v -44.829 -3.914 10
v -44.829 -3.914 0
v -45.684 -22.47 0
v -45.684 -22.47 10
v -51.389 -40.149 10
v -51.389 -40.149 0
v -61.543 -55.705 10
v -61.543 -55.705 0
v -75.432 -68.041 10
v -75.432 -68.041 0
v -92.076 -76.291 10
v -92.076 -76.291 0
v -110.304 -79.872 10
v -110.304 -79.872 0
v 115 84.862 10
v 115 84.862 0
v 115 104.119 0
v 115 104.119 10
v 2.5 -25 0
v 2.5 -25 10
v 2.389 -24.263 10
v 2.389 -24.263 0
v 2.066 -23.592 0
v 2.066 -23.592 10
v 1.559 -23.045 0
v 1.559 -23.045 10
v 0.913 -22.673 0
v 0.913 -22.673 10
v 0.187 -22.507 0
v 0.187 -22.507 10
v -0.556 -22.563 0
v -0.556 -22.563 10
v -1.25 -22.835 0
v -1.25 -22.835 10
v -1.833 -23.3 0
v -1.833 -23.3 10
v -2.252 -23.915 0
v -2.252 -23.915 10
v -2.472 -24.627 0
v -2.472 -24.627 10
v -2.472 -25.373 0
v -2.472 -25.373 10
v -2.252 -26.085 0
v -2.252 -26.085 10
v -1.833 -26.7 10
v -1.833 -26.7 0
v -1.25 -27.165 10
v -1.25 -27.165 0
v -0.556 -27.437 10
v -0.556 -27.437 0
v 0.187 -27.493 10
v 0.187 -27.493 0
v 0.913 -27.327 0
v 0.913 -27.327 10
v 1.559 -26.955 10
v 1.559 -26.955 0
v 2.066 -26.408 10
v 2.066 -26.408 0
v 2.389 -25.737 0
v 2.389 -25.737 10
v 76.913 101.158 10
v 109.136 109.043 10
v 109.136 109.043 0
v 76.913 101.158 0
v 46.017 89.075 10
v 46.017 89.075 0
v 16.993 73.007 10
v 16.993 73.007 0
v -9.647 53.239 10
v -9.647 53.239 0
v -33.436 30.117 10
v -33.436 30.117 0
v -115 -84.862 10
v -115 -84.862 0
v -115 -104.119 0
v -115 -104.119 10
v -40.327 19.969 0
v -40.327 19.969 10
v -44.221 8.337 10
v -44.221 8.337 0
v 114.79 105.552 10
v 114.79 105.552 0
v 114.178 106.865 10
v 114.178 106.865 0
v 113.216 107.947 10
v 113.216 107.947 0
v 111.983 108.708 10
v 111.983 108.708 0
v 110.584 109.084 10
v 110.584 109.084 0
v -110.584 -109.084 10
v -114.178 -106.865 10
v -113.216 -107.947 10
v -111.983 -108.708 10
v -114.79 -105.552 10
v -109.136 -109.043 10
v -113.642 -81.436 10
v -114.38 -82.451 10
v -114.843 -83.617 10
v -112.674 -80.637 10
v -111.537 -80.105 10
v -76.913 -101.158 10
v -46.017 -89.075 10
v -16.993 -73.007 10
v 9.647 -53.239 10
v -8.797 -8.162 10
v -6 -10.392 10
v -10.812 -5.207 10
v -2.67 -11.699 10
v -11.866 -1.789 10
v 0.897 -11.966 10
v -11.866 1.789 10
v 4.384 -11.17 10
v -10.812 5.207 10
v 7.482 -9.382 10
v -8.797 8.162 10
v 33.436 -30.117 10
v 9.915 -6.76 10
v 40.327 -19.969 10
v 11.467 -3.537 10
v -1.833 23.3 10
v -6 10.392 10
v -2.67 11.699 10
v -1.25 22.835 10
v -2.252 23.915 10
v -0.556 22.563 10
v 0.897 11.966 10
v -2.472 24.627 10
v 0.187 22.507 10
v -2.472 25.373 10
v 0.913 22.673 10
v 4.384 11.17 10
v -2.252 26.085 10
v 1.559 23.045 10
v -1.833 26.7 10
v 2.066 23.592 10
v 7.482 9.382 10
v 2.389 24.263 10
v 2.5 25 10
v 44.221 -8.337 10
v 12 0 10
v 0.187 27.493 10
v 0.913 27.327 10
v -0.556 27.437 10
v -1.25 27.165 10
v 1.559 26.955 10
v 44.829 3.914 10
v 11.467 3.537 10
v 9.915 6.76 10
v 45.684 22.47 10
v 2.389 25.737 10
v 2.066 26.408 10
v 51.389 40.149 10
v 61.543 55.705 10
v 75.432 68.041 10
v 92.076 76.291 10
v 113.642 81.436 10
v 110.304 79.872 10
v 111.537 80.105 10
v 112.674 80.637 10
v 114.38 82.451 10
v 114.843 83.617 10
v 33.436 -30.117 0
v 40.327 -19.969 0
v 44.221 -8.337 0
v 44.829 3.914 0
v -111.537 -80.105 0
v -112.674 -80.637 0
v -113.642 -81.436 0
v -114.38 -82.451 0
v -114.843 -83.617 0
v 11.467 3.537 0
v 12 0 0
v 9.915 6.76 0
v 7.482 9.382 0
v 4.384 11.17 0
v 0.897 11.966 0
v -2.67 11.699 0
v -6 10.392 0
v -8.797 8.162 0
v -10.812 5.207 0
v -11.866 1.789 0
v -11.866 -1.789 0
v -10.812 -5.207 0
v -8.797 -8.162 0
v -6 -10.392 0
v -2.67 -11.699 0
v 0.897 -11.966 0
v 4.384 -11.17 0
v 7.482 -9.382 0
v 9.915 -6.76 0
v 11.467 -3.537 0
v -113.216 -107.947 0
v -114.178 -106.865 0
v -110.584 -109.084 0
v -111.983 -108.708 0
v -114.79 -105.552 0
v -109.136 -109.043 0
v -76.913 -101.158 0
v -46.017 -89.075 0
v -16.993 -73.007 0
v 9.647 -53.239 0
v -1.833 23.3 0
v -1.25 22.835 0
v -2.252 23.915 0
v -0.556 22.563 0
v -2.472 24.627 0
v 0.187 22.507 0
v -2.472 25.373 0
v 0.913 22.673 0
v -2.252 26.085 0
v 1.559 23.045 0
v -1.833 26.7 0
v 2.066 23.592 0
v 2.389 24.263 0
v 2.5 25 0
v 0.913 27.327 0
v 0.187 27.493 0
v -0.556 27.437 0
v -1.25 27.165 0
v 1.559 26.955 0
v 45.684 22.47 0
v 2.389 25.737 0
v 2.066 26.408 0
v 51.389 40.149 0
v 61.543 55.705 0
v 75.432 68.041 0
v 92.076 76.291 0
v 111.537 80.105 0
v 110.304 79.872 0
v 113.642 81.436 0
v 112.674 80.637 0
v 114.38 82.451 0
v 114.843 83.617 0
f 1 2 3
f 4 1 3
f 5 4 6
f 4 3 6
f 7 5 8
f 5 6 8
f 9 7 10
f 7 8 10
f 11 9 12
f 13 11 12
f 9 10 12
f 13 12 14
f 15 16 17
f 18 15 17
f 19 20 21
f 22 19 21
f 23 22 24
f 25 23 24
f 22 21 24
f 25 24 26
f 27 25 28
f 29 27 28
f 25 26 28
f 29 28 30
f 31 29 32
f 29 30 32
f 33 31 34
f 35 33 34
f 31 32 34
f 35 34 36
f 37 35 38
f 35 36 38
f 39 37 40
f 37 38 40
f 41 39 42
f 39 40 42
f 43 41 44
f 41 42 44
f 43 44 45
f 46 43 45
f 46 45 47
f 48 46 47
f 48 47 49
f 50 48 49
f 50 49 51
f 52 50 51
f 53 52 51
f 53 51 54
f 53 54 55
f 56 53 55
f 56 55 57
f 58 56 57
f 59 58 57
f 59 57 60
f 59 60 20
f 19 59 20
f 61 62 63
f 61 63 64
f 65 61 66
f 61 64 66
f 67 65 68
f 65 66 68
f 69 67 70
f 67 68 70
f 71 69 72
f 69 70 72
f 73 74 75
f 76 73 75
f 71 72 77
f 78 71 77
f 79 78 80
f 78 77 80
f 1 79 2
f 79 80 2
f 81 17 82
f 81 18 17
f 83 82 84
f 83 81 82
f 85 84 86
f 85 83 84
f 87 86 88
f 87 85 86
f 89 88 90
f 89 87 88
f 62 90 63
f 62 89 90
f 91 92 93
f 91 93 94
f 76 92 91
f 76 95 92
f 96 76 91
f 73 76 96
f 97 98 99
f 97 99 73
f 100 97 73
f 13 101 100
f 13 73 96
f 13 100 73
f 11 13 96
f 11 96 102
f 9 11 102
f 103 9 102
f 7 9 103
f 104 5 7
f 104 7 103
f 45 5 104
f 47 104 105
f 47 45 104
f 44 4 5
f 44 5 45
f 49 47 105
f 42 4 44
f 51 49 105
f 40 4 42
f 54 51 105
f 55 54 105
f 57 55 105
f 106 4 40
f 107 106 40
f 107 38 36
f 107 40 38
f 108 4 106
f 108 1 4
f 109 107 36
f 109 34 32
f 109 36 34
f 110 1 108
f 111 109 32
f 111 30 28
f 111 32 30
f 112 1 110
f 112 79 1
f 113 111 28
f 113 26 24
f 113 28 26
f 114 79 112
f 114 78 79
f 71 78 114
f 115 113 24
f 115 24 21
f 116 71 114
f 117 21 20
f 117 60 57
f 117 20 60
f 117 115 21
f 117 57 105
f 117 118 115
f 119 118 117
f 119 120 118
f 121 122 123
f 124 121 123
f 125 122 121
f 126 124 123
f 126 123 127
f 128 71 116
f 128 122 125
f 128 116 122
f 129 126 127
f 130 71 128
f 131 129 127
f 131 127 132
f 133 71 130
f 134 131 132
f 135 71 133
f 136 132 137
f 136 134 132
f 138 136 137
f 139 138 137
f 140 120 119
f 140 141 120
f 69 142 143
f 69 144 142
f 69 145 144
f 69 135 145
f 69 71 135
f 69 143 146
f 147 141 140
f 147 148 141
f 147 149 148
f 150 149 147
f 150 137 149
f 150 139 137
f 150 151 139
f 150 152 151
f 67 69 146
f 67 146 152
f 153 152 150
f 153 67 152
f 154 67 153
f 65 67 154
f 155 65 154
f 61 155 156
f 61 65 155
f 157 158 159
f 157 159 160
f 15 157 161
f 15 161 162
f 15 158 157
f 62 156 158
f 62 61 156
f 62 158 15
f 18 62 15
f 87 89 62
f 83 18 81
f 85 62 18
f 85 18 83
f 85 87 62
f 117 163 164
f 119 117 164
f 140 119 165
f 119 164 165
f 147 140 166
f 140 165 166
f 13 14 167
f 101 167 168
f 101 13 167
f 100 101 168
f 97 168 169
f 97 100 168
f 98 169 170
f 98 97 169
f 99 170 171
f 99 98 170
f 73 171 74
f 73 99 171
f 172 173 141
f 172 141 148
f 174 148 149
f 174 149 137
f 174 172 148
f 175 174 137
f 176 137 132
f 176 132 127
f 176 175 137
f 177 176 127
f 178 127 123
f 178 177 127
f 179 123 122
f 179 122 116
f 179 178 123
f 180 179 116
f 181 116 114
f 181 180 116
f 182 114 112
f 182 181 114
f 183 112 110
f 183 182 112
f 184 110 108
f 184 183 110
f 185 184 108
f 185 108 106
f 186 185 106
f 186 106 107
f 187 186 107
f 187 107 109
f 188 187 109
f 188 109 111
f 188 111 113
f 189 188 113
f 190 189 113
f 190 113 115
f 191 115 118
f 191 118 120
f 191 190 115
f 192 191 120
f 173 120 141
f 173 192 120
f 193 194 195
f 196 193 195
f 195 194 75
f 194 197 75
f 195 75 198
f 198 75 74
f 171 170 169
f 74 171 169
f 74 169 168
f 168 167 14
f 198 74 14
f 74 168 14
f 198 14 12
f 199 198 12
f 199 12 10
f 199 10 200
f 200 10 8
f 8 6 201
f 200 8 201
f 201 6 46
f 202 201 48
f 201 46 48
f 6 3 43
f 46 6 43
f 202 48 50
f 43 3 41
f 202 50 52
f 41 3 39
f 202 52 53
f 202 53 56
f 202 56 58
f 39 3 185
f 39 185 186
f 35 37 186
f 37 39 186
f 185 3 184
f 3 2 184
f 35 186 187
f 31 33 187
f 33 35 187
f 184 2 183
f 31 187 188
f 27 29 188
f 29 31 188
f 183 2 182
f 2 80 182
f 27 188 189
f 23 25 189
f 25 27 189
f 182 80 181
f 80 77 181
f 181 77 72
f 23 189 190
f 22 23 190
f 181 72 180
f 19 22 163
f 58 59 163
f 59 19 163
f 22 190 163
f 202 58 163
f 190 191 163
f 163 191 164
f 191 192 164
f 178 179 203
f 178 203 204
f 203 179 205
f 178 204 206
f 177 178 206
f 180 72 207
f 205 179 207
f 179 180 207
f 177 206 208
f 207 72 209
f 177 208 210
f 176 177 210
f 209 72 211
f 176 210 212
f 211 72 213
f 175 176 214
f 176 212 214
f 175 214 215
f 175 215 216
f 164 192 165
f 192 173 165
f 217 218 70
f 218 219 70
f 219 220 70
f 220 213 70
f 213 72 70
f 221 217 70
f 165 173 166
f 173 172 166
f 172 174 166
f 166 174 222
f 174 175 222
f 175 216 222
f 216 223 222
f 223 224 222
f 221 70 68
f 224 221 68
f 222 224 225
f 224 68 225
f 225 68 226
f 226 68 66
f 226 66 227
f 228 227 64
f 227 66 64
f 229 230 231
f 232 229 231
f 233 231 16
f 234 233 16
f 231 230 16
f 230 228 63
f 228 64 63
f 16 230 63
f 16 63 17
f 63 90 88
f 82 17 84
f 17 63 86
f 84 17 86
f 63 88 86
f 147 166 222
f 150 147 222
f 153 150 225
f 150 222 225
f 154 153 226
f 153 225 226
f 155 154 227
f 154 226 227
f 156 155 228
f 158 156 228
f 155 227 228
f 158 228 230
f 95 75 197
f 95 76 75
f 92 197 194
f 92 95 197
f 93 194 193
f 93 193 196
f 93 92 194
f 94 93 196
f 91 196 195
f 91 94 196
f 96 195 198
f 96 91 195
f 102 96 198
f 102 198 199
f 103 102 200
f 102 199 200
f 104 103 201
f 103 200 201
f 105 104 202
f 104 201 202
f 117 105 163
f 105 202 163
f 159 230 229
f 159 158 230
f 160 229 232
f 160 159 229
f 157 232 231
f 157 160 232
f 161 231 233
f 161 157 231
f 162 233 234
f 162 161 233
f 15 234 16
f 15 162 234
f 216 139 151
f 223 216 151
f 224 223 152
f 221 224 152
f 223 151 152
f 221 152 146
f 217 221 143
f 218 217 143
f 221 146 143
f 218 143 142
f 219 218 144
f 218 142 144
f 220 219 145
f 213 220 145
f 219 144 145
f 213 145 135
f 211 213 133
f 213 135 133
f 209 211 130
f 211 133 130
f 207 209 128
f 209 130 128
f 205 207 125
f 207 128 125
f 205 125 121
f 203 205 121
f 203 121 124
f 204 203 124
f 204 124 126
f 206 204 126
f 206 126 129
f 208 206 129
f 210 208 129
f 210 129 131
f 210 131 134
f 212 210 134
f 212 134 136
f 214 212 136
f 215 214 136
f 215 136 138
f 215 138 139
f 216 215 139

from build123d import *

# Parameters (mm, degrees)
SKETCH1_R           = 45
SKETCH1_R_2         = 12
BOSS_EXTRUDE1_DEPTH = 10
BOSS_EXTRUDE3_START = -10
BOSS_EXTRUDE3_DEPTH = 10
FILLET2_R           = 5
SKETCH3_R           = 2.5
CUT_EXTRUDE1_DEPTH  = 159.845357518


with BuildPart() as part:
    # Sketch1 → Boss-Extrude1 (new body)
    with BuildSketch(Plane.XY):
        Circle(SKETCH1_R)
        Circle(SKETCH1_R_2, mode=Mode.SUBTRACT)
    extrude(amount=BOSS_EXTRUDE1_DEPTH)

    # Sketch2 → Boss-Extrude3 (add)
    with BuildSketch(Plane.XY.offset(10).offset(BOSS_EXTRUDE3_START)):
        with BuildLine():
            ThreePointArc((33.436200174, -30.116781334), (-14.286491123, -42.671960013), (-44.829498519, -3.91357414))
            ThreePointArc((-44.829498519, -3.91357414), (-63.106761283, -57.457908747), (-115, -80))
            Line((-115, -80), (-115, -110))
            ThreePointArc((-115, -110), (-33.84606429, -82.946317595), (33.436200174, -30.116781334))
        make_face()
        with BuildLine():
            Line((115, 80), (115, 110))
            ThreePointArc((115, 110), (33.84606429, 82.946317595), (-33.436200174, 30.116781334))
            ThreePointArc((-33.436200174, 30.116781334), (14.286491123, 42.671960013), (44.829498519, 3.91357414))
            ThreePointArc((44.829498519, 3.91357414), (63.106761283, 57.457908747), (115, 80))
        make_face()
    extrude(amount=BOSS_EXTRUDE3_DEPTH)

    # Fillet2
    fillet2_edges = [part.edges().sort_by_distance(p)[0] for p in [
        (-115, -110, 5),
        (-115, -80, 5),
        (115, 80, 5),
        (115, 110, 5),
    ]]
    fillet(fillet2_edges, radius=FILLET2_R)

    # Sketch3 → Cut-Extrude1 (cut, through all)
    with BuildSketch(Plane.XY.offset(10)):
        with Locations((0, 25)):
            Circle(SKETCH3_R)
        with Locations((0, -25)):
            Circle(SKETCH3_R)
    extrude(amount=-CUT_EXTRUDE1_DEPTH, mode=Mode.SUBTRACT)


solid = part.part
